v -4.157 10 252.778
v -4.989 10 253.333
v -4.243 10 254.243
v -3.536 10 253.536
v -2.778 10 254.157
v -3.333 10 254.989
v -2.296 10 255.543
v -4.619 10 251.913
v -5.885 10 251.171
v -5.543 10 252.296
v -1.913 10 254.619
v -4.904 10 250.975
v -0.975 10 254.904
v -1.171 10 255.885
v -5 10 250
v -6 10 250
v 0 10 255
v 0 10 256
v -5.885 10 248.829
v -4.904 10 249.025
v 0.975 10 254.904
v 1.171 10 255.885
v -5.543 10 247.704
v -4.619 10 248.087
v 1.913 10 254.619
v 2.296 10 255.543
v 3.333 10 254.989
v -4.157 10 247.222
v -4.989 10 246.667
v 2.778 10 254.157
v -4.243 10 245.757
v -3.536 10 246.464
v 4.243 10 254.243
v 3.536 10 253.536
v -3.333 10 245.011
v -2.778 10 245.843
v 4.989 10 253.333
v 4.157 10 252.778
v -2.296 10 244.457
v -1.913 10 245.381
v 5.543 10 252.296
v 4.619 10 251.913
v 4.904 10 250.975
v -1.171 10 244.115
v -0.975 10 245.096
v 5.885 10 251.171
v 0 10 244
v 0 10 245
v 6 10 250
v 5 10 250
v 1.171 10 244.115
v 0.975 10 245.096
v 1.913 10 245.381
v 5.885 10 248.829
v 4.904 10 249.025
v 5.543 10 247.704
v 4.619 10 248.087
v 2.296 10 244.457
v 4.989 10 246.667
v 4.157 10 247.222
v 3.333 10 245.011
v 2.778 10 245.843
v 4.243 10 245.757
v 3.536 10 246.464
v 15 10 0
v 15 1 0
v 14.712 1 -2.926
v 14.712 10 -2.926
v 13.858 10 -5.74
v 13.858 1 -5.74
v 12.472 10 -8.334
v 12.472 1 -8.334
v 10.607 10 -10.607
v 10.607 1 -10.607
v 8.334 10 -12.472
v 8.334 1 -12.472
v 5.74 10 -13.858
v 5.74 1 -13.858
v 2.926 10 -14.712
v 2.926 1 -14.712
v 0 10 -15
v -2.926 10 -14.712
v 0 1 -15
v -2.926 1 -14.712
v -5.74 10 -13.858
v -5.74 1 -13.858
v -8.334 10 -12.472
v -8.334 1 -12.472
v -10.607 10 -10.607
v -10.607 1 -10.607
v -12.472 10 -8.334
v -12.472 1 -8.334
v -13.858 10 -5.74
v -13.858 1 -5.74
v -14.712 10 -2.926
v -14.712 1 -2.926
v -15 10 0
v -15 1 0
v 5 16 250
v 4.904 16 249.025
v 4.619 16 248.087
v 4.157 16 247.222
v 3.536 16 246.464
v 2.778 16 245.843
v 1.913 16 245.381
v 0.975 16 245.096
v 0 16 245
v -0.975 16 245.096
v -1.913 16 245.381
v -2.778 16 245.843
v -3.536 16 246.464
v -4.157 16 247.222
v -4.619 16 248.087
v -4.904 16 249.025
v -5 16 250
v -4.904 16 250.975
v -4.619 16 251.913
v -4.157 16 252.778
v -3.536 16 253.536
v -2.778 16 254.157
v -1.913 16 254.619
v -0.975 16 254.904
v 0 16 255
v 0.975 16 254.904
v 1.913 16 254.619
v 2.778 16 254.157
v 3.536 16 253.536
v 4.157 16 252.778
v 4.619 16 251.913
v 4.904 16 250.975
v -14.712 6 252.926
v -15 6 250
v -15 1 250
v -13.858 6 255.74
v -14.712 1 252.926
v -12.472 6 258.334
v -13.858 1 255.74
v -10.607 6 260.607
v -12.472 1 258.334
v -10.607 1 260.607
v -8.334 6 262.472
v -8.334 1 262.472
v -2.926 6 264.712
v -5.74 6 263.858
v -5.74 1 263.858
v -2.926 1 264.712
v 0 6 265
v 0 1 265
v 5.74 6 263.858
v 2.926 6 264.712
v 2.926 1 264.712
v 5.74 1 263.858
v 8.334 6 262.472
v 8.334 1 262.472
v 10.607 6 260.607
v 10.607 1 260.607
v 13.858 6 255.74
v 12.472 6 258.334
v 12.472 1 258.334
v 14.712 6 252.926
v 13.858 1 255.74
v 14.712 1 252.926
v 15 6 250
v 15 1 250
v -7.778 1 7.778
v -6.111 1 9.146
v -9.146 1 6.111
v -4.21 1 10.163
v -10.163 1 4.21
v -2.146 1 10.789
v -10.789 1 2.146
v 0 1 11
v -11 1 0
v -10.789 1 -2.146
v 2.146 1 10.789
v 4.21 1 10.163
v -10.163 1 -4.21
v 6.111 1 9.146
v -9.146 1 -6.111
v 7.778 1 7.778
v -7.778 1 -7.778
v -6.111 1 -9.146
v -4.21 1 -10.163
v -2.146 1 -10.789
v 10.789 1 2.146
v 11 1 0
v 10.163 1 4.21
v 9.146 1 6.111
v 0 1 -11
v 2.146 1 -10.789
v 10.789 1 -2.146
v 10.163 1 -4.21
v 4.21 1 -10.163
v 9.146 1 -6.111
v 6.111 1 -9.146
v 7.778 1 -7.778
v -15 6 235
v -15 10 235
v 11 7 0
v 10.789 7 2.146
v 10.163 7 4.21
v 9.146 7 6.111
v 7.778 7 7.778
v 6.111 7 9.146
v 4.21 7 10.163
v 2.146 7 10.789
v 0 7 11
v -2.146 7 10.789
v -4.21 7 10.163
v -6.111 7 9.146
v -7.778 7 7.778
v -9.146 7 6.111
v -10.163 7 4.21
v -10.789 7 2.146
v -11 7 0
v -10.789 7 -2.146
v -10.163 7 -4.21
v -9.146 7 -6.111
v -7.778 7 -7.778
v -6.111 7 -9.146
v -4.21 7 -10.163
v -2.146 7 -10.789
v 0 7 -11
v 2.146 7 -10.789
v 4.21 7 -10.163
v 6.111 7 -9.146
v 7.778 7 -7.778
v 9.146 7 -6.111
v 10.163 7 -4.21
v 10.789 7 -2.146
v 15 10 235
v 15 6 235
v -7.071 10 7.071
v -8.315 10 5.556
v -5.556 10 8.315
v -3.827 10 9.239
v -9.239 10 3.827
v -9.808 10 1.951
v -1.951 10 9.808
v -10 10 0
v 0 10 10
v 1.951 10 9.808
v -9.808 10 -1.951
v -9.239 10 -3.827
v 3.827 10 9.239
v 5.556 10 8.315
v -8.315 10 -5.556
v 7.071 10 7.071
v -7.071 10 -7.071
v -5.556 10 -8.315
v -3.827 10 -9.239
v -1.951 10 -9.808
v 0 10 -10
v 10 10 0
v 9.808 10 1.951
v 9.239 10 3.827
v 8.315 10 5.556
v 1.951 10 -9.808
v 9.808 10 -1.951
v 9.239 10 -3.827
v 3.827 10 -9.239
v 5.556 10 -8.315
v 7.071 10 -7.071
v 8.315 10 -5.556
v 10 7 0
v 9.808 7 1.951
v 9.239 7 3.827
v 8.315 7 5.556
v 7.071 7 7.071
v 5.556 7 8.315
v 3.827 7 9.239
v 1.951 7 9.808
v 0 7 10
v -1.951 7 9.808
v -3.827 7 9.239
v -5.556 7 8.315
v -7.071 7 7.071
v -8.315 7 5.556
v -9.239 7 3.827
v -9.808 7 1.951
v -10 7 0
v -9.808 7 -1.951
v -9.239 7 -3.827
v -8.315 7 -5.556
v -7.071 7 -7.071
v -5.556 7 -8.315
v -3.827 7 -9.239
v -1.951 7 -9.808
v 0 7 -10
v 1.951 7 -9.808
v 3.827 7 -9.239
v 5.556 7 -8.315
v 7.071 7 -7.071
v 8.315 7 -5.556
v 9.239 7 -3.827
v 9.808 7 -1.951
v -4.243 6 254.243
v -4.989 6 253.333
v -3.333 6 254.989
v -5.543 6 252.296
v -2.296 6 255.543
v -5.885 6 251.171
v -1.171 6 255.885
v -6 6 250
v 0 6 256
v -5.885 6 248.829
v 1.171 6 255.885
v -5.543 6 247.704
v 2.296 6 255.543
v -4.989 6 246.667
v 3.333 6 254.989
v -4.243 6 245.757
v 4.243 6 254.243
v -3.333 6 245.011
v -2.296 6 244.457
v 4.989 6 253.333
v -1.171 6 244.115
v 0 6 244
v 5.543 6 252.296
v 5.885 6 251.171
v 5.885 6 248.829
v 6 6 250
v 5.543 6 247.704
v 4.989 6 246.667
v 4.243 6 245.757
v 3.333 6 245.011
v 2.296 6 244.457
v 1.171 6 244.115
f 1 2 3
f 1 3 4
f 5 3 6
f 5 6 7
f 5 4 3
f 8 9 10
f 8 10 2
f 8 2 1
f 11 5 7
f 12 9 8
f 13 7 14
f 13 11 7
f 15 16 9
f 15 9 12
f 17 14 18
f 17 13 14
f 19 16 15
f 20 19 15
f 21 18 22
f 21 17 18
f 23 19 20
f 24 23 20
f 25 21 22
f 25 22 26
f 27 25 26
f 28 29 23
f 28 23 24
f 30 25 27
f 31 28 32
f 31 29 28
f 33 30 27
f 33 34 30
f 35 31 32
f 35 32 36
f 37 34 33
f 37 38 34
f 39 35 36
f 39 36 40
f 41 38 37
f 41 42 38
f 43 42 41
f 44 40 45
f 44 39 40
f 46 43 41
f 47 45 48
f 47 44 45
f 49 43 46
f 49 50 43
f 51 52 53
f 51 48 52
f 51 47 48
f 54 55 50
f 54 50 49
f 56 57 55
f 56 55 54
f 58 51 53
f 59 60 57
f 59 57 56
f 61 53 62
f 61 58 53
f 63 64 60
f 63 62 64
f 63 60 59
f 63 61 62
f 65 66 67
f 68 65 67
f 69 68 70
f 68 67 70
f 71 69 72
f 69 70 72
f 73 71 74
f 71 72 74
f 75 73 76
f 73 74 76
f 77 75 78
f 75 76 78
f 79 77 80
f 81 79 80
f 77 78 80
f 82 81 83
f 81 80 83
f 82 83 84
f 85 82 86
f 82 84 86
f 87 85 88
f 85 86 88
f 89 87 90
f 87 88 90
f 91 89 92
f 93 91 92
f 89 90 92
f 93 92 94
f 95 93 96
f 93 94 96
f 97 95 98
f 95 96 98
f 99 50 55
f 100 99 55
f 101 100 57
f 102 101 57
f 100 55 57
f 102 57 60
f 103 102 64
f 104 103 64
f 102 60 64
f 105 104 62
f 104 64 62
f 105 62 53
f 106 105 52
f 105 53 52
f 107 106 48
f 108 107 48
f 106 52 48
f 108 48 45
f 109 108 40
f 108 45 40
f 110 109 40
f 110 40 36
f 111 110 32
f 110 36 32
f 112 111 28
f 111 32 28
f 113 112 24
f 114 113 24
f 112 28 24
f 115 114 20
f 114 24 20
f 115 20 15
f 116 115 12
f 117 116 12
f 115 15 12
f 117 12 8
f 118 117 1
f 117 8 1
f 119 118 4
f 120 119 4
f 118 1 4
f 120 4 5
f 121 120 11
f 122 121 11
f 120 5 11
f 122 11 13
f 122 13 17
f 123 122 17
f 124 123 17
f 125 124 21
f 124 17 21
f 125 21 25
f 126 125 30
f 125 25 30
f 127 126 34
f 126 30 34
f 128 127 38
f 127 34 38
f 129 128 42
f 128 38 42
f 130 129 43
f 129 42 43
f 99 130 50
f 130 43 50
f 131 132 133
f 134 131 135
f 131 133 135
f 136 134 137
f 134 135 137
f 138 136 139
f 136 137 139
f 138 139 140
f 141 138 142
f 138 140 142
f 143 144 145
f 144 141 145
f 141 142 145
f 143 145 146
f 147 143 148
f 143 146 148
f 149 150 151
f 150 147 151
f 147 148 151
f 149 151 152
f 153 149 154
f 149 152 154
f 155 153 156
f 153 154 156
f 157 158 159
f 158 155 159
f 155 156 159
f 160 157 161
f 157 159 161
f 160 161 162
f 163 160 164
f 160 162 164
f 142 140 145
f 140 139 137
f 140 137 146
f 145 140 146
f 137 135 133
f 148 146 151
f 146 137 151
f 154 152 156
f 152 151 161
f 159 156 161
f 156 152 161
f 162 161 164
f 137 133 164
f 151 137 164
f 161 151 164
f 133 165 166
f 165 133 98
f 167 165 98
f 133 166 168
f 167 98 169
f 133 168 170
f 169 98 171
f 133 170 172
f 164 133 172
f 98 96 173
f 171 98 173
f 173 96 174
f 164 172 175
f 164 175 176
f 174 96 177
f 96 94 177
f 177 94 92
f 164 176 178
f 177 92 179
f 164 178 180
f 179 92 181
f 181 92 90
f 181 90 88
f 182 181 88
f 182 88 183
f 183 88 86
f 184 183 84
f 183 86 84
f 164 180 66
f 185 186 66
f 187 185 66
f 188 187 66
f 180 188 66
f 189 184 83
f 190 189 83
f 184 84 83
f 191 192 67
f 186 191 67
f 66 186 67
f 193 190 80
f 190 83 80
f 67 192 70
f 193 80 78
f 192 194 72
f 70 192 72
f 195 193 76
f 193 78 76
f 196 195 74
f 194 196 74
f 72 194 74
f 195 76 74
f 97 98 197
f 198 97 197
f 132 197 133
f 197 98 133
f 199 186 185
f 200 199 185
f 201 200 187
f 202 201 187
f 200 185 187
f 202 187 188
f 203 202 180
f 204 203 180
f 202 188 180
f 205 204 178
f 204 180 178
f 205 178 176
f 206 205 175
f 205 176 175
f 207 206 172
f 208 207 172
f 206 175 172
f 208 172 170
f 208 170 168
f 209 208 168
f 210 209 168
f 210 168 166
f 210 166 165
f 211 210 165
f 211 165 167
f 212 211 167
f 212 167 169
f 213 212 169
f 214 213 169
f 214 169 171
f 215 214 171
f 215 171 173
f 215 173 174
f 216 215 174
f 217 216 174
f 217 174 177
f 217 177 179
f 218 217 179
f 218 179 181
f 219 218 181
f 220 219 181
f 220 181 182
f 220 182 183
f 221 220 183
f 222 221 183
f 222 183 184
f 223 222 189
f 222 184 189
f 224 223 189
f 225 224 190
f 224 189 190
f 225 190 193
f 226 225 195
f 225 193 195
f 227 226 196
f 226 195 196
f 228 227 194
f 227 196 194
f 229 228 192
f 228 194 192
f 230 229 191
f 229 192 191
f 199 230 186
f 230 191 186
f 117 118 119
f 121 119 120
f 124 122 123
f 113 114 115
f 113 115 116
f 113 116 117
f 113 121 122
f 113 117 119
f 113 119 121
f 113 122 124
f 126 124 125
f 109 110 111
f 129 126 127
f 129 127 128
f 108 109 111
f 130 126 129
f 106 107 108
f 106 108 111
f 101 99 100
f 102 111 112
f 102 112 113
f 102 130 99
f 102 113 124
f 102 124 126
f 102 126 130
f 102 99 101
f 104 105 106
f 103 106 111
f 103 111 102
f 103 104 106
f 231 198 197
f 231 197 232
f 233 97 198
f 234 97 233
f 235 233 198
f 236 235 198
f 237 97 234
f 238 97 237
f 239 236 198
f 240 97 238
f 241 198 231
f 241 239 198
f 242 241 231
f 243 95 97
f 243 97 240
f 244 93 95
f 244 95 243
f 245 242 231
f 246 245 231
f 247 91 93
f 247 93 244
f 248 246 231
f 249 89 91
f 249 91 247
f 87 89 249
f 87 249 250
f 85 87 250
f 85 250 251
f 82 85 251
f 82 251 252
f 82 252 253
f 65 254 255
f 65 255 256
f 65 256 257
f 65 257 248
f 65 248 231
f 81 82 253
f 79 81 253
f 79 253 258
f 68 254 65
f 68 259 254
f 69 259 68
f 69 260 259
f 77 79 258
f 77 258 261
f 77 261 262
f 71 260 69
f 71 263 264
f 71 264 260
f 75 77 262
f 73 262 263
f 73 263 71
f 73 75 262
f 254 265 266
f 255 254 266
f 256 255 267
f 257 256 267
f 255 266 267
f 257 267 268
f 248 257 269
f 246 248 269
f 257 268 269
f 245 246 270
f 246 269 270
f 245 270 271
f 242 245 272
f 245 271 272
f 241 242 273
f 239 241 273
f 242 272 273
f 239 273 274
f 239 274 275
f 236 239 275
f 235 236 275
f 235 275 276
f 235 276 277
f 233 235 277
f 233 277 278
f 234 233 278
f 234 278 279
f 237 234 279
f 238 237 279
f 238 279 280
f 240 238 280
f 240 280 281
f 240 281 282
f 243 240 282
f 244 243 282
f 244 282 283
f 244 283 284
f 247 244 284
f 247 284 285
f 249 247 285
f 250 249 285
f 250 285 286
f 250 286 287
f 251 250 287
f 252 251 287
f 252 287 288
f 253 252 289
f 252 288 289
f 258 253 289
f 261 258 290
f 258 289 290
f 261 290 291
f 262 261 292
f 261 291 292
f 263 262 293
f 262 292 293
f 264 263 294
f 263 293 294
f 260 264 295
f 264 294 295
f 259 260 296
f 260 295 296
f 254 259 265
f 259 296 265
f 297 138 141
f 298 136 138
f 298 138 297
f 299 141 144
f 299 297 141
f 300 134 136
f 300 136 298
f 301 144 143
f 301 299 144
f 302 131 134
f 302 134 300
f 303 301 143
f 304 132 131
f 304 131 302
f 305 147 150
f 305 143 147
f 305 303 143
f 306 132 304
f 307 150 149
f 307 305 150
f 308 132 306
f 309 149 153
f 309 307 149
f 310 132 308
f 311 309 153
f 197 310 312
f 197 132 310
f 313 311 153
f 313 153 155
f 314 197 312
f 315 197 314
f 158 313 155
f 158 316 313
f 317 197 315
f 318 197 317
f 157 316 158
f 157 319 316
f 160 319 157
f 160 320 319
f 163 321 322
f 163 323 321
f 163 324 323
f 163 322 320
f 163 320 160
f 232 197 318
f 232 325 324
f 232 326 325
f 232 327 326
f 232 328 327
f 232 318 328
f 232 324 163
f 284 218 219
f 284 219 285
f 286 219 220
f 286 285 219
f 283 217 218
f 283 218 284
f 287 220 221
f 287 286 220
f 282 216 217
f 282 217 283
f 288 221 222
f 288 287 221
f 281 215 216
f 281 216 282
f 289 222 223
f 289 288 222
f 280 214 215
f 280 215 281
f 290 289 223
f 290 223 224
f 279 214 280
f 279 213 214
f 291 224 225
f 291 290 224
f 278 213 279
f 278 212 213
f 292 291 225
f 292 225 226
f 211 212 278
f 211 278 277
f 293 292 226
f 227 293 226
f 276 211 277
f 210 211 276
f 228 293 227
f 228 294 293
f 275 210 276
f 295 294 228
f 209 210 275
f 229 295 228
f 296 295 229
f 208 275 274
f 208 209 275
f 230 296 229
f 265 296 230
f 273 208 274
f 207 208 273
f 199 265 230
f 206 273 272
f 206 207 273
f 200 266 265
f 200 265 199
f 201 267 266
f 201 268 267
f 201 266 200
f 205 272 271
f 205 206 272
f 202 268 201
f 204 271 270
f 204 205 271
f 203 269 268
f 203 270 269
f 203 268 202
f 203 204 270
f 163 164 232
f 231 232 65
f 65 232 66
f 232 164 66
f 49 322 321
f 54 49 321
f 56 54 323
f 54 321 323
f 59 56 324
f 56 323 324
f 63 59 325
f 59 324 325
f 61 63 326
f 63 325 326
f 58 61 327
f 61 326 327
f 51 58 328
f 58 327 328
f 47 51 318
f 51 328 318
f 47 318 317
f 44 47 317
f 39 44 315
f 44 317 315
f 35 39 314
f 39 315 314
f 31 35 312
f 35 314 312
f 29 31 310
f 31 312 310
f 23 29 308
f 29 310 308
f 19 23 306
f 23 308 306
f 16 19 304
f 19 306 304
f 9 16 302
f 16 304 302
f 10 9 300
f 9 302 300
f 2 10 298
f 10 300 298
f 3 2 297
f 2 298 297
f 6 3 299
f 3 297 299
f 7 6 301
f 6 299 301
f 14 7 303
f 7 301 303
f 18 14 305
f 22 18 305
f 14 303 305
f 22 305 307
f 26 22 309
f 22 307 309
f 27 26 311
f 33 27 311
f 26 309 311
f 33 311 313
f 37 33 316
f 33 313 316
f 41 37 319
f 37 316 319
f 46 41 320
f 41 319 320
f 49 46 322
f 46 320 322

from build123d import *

# Parameters (mm, degrees)
SKETCH_1_R          = 6
EXTRUDE_1_DEPTH     = 1
EXTRUDE_2_DEPTH     = 9
SKETCH_8_W          = 30
SKETCH_8_H          = 30
CUT_EXTRUDE_2_DEPTH = 4
SKETCH_9_R          = 6
EXTRUDE_6_DEPTH     = 4
SKETCH_10_R         = 5
EXTRUDE_7_DEPTH     = 6
SKETCH_11_R         = 11
CUT_EXTRUDE_3_DEPTH = 7
SKETCH_12_R         = 10
CUT_EXTRUDE_4_DEPTH = 10


with BuildPart() as part:
    # 스케치1 → 보스-돌출1 (new body)
    with BuildSketch(Plane(origin=(0, 0, 0), x_dir=(1, 0, 0), z_dir=(0, 1, 0))):
        Circle(SKETCH_1_R)
    extrude(amount=EXTRUDE_1_DEPTH)

    # 스케치2 → 보스-돌출2 (add)
    with BuildSketch(Plane(origin=(0, 1, 0), x_dir=(1, 0, 0), z_dir=(0, 1, 0))):
        with BuildLine():
            Line((-15, 0), (-15, -250))
            ThreePointArc((-15, -250), (0, -265), (15, -250))
            Line((15, -250), (15, 0))
            ThreePointArc((15, 0), (0, 15), (-15, 0))
        make_face()
    extrude(amount=EXTRUDE_2_DEPTH)

    # 스케치8 → 컷-돌출2 (cut)
    with BuildSketch(Plane(origin=(0, 10, 0), x_dir=(1, 0, 0), z_dir=(0, 1, 0))):
        with Locations((0, -250)):
            Rectangle(SKETCH_8_W, SKETCH_8_H)
    extrude(amount=-CUT_EXTRUDE_2_DEPTH, mode=Mode.SUBTRACT)

    # 스케치9 → 보스-돌출6 (add)
    with BuildSketch(Plane(origin=(0, 6, 0), x_dir=(1, 0, 0), z_dir=(0, 1, 0))):
        with Locations((0, -250)):
            Circle(SKETCH_9_R)
    extrude(amount=EXTRUDE_6_DEPTH)

    # 스케치10 → 보스-돌출7 (add)
    with BuildSketch(Plane(origin=(0, 10, 0), x_dir=(1, 0, 0), z_dir=(0, 1, 0))):
        with Locations((0, -250)):
            Circle(SKETCH_10_R)
    extrude(amount=EXTRUDE_7_DEPTH)

    # 스케치11 → 컷-돌출3 (cut)
    with BuildSketch(Plane.XZ):
        Circle(SKETCH_11_R)
    extrude(amount=-CUT_EXTRUDE_3_DEPTH, mode=Mode.SUBTRACT)

    # 스케치12 → 컷-돌출4 (cut, through all)
    with BuildSketch(Plane.XZ.offset(-7)):
        Circle(SKETCH_12_R)
    extrude(amount=-CUT_EXTRUDE_4_DEPTH, mode=Mode.SUBTRACT)


solid = part.part
